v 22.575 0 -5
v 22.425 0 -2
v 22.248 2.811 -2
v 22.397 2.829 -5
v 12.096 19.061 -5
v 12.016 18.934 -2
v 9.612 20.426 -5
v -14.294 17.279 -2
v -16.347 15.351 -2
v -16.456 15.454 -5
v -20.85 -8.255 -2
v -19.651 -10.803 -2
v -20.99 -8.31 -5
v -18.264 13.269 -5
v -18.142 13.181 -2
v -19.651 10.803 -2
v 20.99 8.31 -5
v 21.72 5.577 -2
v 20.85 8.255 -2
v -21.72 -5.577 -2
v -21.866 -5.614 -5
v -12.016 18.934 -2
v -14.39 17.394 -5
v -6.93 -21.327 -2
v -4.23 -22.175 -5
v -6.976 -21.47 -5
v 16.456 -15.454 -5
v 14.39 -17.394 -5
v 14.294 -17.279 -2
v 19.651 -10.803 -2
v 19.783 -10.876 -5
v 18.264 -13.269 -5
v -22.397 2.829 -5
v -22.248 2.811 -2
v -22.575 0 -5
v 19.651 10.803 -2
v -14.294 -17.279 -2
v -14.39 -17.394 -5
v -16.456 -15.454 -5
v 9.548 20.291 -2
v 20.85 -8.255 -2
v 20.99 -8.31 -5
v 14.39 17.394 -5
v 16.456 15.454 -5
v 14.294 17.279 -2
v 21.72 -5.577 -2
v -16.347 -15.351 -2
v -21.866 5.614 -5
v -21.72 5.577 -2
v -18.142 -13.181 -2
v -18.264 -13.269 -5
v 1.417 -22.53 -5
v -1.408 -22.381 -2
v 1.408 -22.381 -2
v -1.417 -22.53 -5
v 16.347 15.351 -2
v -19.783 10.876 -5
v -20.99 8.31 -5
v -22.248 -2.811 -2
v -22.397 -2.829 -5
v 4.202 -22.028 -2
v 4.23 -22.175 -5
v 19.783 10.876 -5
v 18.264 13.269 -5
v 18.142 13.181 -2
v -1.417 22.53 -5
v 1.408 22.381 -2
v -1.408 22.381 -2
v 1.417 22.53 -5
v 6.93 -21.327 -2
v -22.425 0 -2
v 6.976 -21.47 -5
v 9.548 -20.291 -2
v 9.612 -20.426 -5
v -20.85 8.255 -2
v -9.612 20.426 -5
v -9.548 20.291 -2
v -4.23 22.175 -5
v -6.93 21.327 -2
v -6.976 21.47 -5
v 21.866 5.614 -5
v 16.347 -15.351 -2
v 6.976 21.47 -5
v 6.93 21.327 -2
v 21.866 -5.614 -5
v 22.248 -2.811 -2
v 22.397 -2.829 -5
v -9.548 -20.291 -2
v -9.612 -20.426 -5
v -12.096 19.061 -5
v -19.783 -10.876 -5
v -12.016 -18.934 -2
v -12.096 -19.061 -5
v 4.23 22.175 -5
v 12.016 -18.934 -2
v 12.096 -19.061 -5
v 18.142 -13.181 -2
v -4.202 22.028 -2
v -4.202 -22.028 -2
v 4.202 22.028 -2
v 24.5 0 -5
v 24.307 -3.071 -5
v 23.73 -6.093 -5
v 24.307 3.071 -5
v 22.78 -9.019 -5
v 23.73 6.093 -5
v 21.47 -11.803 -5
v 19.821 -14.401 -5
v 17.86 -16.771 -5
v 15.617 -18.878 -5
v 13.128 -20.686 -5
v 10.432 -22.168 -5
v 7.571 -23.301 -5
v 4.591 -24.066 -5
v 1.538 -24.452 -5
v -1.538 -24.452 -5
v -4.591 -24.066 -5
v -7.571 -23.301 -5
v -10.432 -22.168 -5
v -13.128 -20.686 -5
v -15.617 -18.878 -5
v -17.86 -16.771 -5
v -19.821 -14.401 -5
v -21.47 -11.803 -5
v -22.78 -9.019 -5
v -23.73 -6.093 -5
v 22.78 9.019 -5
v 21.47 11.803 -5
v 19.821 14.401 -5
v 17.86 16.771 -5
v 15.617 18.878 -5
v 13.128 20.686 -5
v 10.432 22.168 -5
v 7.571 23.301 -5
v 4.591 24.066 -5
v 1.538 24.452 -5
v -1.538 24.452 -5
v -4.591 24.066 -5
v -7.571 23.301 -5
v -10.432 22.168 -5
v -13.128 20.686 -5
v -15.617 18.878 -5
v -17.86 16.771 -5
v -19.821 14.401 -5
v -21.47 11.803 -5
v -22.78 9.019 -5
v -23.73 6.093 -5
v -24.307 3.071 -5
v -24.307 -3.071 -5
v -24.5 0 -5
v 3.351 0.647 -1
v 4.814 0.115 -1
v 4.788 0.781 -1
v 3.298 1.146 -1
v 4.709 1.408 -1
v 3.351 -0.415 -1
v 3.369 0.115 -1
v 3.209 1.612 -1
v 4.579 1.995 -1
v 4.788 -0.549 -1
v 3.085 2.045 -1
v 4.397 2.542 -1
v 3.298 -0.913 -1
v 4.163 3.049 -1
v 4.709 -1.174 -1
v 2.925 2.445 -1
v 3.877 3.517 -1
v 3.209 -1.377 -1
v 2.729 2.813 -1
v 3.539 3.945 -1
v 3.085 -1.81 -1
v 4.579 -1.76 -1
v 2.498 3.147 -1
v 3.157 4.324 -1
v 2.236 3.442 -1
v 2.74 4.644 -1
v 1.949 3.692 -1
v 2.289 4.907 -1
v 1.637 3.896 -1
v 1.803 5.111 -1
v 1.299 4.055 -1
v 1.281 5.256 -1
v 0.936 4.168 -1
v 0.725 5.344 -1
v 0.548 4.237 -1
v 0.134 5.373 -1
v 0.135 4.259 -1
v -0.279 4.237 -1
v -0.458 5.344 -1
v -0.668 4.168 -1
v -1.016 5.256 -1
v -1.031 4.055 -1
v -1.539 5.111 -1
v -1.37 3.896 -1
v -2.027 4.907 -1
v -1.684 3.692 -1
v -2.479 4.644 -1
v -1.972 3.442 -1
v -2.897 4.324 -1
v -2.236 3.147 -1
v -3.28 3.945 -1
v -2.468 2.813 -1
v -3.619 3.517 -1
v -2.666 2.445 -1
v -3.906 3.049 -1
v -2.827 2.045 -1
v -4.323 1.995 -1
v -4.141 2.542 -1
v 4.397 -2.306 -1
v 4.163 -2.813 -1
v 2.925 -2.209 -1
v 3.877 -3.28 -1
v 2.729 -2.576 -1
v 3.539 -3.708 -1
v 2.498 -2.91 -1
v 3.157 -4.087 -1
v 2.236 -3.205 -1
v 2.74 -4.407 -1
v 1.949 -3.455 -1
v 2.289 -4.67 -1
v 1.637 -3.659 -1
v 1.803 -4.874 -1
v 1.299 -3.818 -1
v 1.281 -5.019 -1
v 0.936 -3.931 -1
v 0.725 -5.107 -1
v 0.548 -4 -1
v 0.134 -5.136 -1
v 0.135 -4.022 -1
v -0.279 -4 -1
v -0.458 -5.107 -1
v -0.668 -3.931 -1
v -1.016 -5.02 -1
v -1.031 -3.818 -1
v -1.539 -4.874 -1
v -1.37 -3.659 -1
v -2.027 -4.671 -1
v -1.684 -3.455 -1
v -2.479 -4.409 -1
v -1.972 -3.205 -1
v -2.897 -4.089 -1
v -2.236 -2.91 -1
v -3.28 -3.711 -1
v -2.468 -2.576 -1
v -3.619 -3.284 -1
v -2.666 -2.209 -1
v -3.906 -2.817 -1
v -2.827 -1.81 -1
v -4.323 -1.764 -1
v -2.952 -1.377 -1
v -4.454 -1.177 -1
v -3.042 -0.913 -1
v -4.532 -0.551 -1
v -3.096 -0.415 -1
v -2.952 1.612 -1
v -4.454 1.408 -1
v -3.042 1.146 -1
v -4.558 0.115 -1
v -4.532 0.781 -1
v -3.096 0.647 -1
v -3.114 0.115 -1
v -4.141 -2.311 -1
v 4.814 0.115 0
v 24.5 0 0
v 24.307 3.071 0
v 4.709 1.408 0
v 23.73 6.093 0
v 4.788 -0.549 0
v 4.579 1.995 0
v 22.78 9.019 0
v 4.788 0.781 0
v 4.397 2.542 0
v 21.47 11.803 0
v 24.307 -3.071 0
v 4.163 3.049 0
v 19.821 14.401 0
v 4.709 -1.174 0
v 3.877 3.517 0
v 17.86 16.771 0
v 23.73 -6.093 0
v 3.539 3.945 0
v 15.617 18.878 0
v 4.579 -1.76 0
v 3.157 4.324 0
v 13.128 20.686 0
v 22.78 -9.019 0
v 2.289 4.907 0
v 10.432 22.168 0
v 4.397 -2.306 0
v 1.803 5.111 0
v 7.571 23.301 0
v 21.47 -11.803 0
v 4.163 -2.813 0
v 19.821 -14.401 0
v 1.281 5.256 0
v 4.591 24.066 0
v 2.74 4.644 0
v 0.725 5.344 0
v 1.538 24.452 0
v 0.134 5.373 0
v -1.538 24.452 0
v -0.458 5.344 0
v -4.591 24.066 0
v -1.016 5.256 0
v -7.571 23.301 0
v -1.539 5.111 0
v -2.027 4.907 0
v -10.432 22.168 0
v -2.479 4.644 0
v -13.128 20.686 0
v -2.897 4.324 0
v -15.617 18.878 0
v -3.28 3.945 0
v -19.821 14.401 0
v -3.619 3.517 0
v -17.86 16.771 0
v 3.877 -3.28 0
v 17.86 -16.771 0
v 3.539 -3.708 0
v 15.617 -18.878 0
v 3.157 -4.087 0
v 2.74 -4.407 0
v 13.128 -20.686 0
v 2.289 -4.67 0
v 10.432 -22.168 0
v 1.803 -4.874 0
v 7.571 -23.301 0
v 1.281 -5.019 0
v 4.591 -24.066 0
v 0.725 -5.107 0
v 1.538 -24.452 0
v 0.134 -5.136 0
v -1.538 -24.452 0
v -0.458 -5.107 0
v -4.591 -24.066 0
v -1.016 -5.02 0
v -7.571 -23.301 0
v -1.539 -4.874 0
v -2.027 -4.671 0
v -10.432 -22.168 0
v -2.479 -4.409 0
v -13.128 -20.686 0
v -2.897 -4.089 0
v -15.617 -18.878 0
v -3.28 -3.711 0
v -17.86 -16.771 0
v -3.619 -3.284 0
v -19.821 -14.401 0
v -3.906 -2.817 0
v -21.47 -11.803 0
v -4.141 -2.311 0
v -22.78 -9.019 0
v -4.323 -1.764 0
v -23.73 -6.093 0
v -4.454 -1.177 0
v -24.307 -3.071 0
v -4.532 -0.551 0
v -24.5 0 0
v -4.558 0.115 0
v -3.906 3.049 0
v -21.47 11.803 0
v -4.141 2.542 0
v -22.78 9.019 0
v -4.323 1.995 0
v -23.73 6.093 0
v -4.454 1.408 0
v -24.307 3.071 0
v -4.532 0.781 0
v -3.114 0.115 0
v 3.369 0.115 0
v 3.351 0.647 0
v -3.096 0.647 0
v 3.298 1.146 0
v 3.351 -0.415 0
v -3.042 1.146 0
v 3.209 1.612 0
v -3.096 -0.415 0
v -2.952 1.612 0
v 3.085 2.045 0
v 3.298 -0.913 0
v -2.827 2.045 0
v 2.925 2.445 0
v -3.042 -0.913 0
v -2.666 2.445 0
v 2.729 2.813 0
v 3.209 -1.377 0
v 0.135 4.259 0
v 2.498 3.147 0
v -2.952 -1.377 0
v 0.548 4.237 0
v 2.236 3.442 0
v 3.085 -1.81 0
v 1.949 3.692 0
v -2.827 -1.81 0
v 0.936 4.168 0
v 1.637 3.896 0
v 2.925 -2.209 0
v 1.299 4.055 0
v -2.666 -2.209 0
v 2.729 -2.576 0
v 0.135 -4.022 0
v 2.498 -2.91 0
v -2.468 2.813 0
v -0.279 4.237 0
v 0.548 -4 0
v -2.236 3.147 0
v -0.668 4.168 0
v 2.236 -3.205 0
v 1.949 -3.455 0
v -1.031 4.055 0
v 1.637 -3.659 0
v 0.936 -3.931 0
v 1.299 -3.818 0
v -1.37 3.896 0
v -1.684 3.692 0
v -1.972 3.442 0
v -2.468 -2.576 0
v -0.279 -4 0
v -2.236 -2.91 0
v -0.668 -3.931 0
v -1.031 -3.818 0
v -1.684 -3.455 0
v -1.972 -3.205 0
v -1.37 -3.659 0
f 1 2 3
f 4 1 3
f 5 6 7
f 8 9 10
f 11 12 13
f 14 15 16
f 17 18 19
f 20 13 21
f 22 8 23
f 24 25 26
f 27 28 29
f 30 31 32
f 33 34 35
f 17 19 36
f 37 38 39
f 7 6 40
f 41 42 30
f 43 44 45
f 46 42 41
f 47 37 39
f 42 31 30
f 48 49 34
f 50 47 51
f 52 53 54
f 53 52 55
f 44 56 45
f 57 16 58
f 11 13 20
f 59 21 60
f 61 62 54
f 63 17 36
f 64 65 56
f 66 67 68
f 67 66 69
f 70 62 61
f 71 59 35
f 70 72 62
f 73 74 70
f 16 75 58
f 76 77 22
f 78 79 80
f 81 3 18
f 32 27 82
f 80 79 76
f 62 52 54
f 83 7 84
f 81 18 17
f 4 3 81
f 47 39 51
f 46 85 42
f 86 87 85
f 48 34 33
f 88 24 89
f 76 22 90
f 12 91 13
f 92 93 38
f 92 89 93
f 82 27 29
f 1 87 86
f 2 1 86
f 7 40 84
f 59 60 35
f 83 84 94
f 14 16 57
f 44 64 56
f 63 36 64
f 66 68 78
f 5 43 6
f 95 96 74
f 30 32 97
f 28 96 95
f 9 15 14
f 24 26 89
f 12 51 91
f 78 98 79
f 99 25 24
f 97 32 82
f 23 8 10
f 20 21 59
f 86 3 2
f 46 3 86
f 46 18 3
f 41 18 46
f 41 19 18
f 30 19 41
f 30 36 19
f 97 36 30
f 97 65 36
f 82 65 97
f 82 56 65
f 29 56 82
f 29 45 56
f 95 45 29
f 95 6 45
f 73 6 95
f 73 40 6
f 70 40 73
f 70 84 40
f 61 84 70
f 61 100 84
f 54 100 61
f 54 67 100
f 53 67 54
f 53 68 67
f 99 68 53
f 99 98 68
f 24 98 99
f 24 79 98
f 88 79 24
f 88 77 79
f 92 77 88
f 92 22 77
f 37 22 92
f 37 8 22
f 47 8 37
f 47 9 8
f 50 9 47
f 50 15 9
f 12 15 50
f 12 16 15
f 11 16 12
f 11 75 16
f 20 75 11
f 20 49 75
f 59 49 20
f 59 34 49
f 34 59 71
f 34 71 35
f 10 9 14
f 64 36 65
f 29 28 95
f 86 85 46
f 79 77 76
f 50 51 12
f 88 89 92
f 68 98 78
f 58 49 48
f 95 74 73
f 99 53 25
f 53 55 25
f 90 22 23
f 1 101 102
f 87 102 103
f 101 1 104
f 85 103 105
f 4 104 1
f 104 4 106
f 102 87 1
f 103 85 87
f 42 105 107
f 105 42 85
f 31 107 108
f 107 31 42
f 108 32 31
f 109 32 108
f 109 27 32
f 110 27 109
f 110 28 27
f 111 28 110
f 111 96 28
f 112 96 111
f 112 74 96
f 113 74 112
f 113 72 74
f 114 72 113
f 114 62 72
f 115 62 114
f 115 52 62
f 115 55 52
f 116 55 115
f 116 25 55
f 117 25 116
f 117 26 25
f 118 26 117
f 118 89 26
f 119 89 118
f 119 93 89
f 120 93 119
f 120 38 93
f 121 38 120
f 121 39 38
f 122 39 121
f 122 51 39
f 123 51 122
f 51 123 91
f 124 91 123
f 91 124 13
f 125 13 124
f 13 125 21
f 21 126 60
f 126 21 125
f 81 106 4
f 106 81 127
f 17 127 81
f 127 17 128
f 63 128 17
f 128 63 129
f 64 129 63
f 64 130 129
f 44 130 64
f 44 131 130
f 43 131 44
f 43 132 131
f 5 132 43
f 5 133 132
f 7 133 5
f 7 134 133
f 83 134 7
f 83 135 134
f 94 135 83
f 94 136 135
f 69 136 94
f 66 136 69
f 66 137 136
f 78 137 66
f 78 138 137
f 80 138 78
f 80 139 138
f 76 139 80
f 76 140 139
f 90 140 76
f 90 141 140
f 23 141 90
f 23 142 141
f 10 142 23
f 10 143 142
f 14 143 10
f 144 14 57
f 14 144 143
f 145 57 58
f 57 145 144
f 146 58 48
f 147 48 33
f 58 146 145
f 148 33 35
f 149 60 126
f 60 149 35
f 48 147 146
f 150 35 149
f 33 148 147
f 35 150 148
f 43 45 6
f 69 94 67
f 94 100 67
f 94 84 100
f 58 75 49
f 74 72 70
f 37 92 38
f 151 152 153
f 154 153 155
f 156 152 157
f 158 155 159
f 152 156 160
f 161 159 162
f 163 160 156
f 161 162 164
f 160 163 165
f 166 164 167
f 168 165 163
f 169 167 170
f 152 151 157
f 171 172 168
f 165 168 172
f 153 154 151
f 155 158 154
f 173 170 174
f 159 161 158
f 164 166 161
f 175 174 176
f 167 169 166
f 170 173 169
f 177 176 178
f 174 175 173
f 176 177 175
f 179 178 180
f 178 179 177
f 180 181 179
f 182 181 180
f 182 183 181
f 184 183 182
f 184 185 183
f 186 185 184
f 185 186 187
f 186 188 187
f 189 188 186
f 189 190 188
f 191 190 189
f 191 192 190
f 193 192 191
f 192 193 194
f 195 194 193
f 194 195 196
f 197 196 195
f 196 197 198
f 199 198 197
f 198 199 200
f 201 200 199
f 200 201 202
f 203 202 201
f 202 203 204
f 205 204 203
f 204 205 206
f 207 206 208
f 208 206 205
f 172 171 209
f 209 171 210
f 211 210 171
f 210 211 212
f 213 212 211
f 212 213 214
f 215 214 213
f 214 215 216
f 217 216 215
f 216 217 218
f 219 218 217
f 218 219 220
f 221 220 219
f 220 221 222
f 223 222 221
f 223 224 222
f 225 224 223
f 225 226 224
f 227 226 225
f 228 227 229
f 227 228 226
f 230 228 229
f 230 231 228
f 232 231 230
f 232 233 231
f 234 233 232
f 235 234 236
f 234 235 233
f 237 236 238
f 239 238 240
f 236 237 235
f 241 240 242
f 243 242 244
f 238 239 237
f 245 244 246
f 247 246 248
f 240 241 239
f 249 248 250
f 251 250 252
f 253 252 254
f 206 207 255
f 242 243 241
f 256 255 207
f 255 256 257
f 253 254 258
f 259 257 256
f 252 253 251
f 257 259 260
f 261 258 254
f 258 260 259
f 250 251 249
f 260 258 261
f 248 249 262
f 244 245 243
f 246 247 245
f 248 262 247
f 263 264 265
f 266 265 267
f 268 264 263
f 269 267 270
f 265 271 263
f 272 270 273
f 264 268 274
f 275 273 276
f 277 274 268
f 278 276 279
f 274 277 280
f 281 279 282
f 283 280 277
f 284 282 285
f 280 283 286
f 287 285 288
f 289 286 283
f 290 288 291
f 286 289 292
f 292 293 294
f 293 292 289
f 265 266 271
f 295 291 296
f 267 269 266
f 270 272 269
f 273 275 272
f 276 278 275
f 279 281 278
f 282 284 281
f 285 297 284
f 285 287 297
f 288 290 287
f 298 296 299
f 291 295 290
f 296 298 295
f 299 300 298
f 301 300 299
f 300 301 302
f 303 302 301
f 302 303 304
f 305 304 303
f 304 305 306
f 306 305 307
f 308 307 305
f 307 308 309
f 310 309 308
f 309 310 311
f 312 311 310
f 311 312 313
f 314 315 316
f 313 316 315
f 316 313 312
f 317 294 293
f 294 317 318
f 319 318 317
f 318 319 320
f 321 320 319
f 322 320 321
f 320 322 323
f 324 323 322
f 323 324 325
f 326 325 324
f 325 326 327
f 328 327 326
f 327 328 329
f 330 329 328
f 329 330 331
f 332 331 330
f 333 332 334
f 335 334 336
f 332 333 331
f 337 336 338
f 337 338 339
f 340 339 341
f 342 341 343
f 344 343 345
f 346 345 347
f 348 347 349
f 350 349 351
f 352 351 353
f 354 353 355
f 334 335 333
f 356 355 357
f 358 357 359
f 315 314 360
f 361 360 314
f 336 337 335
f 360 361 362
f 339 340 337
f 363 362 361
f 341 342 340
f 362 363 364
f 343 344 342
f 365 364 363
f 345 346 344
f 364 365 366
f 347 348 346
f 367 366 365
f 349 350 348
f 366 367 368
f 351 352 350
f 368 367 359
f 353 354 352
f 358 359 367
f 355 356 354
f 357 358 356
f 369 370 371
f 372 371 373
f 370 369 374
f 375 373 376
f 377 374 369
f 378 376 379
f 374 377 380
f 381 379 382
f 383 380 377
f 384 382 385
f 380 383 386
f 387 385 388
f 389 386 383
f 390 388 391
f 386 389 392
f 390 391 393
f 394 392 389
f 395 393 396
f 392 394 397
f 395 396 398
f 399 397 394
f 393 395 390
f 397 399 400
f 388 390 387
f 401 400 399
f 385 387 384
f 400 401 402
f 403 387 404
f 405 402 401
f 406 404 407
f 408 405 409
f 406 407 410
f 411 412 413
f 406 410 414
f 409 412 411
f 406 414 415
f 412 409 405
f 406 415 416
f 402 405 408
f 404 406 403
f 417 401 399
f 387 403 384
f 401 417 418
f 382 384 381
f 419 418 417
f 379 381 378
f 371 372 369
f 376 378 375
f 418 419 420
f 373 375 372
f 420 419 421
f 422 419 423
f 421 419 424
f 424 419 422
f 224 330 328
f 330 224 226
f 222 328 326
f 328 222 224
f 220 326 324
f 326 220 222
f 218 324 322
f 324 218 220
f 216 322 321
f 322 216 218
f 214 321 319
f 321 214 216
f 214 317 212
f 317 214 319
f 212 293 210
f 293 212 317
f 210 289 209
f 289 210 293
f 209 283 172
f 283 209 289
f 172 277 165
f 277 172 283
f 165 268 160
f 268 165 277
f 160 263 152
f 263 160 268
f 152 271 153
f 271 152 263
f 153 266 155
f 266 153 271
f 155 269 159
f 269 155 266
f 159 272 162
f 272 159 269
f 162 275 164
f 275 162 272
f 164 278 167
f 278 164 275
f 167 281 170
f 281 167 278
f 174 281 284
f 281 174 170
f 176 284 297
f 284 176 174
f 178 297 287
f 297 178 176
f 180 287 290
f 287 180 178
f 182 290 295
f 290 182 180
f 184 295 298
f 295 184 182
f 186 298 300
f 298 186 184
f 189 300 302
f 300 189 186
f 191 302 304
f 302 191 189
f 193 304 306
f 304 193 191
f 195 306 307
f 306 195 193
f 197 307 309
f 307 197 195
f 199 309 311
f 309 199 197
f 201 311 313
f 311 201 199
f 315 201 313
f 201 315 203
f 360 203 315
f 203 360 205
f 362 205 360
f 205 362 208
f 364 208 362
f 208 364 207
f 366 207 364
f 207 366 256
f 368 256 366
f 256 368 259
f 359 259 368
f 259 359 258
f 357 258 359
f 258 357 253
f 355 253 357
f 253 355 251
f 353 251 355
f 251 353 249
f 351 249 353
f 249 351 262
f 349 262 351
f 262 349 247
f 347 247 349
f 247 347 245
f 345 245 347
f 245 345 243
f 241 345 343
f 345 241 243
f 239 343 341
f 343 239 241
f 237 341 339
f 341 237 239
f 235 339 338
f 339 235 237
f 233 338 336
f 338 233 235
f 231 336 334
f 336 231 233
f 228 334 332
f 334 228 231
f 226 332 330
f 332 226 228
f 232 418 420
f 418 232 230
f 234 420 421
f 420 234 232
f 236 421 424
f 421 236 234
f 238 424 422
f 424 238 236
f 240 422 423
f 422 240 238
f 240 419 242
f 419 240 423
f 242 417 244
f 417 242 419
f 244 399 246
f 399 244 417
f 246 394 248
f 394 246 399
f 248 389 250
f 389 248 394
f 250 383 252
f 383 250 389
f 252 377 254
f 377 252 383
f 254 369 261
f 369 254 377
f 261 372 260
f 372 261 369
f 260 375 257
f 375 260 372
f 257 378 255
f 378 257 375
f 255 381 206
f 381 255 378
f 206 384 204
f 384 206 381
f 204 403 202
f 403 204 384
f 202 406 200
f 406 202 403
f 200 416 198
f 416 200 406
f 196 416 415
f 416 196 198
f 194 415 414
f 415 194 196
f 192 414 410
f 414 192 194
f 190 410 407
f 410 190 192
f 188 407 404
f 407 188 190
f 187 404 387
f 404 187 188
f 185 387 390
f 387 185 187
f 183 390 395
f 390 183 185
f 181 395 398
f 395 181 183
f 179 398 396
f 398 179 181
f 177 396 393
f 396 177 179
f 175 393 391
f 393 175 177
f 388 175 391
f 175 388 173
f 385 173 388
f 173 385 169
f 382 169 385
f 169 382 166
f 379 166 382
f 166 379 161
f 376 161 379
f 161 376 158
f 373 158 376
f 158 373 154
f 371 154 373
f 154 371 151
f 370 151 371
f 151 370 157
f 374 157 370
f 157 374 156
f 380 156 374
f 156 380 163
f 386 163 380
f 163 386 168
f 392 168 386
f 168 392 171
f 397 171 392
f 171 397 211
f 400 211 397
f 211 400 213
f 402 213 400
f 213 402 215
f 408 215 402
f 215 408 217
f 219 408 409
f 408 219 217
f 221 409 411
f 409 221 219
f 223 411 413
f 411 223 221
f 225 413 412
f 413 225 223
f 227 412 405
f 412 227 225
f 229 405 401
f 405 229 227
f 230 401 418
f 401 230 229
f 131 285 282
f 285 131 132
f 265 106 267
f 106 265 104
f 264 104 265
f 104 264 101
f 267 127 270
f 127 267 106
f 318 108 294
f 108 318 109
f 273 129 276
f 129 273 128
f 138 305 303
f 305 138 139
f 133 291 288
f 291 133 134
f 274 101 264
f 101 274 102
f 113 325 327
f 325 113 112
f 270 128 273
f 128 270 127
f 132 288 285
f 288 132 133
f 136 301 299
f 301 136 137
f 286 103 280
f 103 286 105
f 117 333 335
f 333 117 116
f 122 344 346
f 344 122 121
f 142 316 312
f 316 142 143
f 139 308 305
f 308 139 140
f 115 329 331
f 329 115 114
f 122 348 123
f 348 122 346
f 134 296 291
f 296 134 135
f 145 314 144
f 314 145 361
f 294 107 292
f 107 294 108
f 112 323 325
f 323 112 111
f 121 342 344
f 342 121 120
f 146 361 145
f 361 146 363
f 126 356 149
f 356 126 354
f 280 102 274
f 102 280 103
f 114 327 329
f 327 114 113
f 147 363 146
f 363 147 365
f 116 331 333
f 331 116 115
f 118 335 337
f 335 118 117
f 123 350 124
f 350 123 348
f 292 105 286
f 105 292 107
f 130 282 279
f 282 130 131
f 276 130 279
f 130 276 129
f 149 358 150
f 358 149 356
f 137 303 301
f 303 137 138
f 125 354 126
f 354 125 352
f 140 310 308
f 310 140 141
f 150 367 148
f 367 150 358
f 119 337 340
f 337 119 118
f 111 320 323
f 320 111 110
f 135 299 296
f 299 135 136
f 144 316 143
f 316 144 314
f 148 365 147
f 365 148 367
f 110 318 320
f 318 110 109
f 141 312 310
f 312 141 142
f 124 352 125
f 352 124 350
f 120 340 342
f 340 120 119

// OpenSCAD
$fn = 50;

difference() {
	union() {
		translate(v = [0, 0, -5.0]) {
			cylinder(h = 5, r = 24.5);
		}
	}
	union() {
		#translate(v = [0, 0, -5.0]) {
			cylinder(h = 3, r1 = 22.575, r2 = 22.425);
		}
		translate(v = [0, 0, -1]) {
			linear_extrude(height = 1) {
				text(font = "Impact", halign = "center", size = 10, text = "O", valign = "center");
			}
		}
	}
}
